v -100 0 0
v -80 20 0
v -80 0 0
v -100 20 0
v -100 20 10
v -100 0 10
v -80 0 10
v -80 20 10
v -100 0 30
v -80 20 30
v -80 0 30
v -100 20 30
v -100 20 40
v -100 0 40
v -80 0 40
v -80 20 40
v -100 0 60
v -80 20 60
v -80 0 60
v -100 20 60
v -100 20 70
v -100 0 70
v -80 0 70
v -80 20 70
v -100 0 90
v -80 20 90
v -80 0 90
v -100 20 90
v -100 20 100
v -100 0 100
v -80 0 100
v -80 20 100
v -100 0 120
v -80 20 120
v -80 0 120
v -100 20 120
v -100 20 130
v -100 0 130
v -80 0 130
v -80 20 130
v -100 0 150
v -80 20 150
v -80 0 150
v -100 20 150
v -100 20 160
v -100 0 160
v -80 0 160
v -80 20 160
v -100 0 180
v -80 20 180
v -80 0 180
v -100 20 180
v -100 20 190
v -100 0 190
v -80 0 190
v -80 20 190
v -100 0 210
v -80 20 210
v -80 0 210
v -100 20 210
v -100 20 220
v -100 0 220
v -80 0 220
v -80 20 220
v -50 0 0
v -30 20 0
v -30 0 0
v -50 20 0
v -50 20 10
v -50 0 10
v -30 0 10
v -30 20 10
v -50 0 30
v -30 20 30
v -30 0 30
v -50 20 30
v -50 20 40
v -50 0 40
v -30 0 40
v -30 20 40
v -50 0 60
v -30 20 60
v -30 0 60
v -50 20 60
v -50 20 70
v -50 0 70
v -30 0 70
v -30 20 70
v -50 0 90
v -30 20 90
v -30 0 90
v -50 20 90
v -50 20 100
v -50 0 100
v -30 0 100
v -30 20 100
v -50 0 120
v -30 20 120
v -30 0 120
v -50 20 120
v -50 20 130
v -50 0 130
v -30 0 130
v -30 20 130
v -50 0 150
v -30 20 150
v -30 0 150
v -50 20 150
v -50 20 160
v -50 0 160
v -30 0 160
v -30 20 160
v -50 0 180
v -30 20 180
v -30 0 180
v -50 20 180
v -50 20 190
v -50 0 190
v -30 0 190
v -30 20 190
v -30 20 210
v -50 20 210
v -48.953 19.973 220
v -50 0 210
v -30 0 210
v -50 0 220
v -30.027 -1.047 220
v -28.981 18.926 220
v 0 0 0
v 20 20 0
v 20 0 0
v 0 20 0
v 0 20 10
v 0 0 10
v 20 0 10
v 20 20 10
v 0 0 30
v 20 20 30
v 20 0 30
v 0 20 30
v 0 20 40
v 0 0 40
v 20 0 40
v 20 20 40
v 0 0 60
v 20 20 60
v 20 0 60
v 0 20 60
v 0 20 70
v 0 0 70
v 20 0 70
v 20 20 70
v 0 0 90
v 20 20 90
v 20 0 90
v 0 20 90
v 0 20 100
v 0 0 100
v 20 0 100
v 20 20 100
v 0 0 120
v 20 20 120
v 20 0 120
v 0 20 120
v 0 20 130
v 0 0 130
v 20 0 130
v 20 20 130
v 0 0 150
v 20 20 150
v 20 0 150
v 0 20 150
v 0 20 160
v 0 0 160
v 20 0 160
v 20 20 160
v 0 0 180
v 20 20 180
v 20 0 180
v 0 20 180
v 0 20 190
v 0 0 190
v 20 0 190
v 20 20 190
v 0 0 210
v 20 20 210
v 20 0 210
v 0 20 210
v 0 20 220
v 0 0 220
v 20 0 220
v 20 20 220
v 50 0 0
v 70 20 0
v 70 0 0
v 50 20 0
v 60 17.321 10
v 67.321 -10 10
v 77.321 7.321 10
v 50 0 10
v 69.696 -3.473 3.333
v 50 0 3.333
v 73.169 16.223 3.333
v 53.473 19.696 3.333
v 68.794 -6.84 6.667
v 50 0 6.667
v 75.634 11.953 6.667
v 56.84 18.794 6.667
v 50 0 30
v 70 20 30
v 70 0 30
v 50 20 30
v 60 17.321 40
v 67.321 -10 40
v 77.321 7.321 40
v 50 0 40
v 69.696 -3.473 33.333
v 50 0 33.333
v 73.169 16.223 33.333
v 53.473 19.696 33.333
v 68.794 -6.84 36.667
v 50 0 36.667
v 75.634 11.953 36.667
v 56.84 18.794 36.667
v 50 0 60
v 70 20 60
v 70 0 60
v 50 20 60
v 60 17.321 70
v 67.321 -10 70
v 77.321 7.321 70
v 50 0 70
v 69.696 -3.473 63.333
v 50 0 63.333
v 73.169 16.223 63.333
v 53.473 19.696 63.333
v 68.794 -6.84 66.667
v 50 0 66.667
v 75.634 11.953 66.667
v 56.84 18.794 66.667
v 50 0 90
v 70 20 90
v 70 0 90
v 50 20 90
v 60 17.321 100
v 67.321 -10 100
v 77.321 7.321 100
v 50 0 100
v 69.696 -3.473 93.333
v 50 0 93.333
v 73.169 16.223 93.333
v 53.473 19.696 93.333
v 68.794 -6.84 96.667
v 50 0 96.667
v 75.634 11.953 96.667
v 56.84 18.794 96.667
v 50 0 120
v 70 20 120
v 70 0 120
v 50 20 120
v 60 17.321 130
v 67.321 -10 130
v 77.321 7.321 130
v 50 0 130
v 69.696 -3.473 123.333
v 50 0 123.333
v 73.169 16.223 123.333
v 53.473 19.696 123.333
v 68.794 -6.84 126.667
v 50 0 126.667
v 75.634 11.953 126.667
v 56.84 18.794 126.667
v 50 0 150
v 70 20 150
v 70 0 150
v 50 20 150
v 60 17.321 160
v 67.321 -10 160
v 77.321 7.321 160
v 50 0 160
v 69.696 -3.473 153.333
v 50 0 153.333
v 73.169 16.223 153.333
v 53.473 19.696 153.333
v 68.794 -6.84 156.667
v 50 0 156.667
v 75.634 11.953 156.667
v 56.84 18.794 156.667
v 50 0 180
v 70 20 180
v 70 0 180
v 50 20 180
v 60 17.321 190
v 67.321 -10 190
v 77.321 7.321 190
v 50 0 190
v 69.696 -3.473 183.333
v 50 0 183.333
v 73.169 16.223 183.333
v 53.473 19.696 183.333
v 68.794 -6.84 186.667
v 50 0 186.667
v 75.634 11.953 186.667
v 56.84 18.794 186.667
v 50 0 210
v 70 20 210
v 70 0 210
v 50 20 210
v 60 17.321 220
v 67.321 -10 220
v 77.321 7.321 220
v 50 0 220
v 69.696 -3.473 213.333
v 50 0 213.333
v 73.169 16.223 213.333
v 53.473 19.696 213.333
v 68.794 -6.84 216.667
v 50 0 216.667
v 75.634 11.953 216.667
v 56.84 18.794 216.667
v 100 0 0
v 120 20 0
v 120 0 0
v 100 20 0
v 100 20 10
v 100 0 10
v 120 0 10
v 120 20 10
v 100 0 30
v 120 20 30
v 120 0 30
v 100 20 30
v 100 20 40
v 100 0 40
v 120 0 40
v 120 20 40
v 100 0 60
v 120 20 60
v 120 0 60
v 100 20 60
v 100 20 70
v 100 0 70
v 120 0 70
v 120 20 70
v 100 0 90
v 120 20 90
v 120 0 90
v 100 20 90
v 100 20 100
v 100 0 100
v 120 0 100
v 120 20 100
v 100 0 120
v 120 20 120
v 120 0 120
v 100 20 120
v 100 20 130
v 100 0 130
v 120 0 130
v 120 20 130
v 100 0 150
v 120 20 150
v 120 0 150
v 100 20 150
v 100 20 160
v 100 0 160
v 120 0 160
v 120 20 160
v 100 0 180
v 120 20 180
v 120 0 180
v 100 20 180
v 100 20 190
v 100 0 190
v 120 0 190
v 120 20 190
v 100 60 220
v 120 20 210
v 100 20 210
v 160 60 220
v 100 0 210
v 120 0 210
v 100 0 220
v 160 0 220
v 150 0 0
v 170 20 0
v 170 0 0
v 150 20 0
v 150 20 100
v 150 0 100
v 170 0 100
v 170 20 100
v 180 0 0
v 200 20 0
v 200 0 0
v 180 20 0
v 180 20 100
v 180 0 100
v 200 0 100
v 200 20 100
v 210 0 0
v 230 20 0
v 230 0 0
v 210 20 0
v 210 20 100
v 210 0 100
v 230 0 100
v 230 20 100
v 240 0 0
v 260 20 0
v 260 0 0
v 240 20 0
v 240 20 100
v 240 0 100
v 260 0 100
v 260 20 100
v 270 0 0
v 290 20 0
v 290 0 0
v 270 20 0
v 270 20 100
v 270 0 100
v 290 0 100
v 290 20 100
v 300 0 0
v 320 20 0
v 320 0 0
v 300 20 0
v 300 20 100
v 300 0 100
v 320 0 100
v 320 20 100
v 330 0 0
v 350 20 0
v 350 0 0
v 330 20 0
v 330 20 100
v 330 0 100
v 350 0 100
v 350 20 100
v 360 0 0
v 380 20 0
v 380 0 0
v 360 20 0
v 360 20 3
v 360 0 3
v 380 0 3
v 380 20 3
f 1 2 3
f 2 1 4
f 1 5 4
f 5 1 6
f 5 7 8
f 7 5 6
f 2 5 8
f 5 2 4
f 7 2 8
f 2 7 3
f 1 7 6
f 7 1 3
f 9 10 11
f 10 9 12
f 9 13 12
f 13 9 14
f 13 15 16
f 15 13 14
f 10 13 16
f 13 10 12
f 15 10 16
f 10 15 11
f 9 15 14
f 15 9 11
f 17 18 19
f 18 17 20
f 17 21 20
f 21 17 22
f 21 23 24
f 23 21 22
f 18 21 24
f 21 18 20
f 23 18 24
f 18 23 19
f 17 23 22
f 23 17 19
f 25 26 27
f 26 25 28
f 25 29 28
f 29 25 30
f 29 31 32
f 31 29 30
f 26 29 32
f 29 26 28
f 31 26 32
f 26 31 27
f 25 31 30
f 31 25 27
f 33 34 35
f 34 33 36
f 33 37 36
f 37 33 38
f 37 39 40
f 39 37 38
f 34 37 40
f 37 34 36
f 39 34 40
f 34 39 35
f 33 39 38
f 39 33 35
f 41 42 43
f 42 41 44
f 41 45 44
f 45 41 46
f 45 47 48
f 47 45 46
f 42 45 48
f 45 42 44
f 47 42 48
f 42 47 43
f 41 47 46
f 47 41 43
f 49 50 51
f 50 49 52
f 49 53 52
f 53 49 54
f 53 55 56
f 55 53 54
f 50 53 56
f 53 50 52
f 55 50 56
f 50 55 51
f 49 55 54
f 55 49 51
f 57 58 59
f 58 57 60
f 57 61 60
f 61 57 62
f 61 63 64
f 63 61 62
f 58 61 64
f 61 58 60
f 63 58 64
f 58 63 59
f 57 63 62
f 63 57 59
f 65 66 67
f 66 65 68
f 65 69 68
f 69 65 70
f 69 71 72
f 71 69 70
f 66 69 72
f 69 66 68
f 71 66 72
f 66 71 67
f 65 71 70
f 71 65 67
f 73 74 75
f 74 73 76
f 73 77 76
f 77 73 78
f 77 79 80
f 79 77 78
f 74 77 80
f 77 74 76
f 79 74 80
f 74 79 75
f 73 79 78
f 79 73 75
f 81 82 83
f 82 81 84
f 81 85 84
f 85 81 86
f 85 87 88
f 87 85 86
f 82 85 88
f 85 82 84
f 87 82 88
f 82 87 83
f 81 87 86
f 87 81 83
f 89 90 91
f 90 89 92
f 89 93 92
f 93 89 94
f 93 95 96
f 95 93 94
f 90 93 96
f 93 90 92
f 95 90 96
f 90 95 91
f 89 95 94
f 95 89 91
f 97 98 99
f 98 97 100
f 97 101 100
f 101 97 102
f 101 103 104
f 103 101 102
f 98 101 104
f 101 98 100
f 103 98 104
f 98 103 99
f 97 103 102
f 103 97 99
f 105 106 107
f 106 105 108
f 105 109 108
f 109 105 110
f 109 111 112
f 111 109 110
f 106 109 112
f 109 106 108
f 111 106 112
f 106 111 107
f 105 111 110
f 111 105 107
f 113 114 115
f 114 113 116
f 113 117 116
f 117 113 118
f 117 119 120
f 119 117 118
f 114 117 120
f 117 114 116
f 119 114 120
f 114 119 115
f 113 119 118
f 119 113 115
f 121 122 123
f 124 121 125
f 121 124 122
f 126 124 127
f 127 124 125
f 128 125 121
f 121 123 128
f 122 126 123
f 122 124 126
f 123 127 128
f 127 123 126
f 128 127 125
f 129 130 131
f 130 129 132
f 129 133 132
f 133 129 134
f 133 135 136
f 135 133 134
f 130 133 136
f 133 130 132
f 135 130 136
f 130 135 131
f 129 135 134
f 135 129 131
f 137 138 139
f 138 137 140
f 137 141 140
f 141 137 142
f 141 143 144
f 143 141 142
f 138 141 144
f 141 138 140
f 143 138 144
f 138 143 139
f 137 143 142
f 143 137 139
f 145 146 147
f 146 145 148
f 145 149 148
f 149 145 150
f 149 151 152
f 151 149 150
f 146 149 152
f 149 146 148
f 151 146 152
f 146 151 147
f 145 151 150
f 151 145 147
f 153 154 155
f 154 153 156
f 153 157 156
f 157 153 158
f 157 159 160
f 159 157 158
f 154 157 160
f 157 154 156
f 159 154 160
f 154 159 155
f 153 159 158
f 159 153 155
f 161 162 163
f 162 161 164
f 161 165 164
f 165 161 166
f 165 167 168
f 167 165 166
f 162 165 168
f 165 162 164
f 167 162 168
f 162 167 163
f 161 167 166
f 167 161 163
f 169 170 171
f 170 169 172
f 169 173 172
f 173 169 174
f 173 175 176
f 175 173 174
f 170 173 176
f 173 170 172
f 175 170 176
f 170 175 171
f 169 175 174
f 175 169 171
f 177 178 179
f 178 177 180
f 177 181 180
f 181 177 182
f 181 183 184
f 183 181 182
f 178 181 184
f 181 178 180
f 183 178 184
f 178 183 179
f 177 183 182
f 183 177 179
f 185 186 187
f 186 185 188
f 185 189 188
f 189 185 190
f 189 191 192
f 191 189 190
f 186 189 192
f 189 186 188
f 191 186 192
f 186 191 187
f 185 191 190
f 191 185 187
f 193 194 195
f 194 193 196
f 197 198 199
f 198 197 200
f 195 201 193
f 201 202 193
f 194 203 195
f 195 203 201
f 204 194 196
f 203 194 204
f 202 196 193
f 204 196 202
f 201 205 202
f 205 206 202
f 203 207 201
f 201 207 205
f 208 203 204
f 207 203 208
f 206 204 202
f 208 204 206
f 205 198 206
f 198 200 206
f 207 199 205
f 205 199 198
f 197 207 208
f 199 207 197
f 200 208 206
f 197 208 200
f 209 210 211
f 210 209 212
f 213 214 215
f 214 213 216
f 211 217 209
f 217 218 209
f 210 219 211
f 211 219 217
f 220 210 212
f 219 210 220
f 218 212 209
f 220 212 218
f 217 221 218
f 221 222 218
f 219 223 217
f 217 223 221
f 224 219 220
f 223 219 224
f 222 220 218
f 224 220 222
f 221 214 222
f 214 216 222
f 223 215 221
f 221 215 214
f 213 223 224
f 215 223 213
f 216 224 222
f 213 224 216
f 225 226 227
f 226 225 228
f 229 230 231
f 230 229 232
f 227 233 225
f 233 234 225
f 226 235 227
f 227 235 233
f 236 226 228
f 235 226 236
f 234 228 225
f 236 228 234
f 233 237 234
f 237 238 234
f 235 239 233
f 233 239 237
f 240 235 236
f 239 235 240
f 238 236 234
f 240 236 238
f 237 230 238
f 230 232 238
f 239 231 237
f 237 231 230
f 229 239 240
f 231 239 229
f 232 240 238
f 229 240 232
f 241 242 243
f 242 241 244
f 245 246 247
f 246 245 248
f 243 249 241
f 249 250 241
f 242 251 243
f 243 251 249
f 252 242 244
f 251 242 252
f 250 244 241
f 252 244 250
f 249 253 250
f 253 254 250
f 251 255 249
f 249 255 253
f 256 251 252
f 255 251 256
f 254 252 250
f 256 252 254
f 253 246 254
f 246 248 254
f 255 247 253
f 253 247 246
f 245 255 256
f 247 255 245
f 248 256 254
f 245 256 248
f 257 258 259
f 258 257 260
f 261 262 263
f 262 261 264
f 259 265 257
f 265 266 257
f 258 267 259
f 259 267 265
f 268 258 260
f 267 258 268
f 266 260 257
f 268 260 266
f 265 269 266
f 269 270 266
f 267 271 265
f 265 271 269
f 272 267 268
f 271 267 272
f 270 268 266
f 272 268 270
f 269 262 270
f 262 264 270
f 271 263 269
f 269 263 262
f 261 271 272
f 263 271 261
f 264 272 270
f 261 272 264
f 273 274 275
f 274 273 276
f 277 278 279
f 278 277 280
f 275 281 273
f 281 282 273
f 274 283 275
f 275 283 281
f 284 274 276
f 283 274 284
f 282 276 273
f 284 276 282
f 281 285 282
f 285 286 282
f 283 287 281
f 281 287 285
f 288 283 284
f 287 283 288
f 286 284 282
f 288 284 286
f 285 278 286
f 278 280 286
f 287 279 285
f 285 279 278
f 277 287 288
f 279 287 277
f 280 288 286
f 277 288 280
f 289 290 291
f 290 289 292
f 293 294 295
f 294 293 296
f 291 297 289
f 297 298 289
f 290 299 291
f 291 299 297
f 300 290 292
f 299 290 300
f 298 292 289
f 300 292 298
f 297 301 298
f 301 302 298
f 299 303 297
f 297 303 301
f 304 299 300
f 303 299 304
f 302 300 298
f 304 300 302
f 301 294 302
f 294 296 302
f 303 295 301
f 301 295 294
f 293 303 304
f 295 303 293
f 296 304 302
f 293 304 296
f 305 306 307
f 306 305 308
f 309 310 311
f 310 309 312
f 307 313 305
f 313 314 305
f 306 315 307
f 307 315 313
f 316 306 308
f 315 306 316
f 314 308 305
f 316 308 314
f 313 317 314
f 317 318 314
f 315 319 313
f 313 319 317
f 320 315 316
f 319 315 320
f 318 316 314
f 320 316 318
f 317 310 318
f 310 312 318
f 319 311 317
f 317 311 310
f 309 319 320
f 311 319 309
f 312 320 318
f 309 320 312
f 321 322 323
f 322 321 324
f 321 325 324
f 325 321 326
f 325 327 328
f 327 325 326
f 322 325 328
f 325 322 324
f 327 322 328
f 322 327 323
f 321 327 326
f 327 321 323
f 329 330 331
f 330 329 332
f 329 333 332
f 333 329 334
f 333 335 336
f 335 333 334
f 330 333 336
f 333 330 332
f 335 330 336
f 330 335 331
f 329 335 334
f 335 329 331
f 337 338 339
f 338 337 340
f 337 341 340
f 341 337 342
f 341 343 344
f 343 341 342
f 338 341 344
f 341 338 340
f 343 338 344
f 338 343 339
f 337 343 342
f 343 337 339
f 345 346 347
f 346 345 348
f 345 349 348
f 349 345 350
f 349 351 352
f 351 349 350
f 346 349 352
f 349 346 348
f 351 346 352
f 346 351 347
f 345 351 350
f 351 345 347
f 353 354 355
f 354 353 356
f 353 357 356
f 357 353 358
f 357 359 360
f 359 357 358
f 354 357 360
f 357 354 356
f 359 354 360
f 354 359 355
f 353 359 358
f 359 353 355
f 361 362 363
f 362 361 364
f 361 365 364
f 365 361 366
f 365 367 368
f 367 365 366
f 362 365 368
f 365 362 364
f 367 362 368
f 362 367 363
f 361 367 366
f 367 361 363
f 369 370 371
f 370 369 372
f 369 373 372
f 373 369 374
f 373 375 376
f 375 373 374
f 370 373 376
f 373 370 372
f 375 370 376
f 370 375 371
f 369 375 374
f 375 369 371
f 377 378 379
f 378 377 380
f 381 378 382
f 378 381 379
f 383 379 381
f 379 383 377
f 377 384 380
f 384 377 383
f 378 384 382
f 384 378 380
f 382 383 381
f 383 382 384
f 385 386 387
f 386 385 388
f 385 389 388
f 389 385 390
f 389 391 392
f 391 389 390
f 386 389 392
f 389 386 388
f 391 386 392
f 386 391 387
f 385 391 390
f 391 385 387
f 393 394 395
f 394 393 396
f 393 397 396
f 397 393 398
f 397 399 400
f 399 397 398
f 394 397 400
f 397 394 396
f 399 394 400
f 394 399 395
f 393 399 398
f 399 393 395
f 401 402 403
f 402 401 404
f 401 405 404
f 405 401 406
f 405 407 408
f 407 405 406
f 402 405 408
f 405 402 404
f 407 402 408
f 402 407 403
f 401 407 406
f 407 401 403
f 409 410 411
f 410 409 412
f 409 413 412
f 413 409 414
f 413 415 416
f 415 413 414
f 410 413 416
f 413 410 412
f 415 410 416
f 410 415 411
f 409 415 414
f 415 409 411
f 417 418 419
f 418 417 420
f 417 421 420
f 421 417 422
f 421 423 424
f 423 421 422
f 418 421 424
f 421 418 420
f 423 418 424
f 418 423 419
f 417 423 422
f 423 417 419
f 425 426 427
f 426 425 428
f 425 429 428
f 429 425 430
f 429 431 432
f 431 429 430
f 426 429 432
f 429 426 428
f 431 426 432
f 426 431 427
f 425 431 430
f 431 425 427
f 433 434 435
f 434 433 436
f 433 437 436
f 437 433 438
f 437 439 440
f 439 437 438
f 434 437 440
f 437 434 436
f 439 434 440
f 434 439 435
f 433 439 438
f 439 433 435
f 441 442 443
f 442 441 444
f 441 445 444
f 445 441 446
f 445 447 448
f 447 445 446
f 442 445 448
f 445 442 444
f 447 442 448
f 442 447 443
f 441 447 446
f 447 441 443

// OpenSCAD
// test cases for linear extrude with various (invalid) parameters

oz = 30;
params = [ [0, undef], [1, 1/0], [2, -1/0], [3, 0/0], [4, ""], [5, true], [6, [1:3]], [7, 3] ];

for (a = params) translate([-100, 0, oz * a[0]])
color("red") linear_extrude(height = 10, convexity = a[1]) square(20);

for (a = params) translate([-50, 0, oz * a[0]])
color("yellow") linear_extrude(height = 10, convexity = undef, scale = 1, twist = a[1]) square(20);

for (a = params) translate([0, 0, oz * a[0]])
color("gray") linear_extrude(height = 10, convexity = undef, scale = 1, twist = 0, slices = a[1]) square(20);

for (a = params) translate([50, 0, oz * a[0]])
color("purple") linear_extrude(height = 10, convexity = undef, scale = 1, twist = 30, slices = a[1]) square(20);

for (a = params) translate([100, 0, oz * a[0]])
color("blue") linear_extrude(height = 10, convexity = 2, scale = a[1]) square(20);

for (a = params) translate([(a[0] + 5) * 30, 0, 0])
color("green") linear_extrude(height = a[1]) square(20);
